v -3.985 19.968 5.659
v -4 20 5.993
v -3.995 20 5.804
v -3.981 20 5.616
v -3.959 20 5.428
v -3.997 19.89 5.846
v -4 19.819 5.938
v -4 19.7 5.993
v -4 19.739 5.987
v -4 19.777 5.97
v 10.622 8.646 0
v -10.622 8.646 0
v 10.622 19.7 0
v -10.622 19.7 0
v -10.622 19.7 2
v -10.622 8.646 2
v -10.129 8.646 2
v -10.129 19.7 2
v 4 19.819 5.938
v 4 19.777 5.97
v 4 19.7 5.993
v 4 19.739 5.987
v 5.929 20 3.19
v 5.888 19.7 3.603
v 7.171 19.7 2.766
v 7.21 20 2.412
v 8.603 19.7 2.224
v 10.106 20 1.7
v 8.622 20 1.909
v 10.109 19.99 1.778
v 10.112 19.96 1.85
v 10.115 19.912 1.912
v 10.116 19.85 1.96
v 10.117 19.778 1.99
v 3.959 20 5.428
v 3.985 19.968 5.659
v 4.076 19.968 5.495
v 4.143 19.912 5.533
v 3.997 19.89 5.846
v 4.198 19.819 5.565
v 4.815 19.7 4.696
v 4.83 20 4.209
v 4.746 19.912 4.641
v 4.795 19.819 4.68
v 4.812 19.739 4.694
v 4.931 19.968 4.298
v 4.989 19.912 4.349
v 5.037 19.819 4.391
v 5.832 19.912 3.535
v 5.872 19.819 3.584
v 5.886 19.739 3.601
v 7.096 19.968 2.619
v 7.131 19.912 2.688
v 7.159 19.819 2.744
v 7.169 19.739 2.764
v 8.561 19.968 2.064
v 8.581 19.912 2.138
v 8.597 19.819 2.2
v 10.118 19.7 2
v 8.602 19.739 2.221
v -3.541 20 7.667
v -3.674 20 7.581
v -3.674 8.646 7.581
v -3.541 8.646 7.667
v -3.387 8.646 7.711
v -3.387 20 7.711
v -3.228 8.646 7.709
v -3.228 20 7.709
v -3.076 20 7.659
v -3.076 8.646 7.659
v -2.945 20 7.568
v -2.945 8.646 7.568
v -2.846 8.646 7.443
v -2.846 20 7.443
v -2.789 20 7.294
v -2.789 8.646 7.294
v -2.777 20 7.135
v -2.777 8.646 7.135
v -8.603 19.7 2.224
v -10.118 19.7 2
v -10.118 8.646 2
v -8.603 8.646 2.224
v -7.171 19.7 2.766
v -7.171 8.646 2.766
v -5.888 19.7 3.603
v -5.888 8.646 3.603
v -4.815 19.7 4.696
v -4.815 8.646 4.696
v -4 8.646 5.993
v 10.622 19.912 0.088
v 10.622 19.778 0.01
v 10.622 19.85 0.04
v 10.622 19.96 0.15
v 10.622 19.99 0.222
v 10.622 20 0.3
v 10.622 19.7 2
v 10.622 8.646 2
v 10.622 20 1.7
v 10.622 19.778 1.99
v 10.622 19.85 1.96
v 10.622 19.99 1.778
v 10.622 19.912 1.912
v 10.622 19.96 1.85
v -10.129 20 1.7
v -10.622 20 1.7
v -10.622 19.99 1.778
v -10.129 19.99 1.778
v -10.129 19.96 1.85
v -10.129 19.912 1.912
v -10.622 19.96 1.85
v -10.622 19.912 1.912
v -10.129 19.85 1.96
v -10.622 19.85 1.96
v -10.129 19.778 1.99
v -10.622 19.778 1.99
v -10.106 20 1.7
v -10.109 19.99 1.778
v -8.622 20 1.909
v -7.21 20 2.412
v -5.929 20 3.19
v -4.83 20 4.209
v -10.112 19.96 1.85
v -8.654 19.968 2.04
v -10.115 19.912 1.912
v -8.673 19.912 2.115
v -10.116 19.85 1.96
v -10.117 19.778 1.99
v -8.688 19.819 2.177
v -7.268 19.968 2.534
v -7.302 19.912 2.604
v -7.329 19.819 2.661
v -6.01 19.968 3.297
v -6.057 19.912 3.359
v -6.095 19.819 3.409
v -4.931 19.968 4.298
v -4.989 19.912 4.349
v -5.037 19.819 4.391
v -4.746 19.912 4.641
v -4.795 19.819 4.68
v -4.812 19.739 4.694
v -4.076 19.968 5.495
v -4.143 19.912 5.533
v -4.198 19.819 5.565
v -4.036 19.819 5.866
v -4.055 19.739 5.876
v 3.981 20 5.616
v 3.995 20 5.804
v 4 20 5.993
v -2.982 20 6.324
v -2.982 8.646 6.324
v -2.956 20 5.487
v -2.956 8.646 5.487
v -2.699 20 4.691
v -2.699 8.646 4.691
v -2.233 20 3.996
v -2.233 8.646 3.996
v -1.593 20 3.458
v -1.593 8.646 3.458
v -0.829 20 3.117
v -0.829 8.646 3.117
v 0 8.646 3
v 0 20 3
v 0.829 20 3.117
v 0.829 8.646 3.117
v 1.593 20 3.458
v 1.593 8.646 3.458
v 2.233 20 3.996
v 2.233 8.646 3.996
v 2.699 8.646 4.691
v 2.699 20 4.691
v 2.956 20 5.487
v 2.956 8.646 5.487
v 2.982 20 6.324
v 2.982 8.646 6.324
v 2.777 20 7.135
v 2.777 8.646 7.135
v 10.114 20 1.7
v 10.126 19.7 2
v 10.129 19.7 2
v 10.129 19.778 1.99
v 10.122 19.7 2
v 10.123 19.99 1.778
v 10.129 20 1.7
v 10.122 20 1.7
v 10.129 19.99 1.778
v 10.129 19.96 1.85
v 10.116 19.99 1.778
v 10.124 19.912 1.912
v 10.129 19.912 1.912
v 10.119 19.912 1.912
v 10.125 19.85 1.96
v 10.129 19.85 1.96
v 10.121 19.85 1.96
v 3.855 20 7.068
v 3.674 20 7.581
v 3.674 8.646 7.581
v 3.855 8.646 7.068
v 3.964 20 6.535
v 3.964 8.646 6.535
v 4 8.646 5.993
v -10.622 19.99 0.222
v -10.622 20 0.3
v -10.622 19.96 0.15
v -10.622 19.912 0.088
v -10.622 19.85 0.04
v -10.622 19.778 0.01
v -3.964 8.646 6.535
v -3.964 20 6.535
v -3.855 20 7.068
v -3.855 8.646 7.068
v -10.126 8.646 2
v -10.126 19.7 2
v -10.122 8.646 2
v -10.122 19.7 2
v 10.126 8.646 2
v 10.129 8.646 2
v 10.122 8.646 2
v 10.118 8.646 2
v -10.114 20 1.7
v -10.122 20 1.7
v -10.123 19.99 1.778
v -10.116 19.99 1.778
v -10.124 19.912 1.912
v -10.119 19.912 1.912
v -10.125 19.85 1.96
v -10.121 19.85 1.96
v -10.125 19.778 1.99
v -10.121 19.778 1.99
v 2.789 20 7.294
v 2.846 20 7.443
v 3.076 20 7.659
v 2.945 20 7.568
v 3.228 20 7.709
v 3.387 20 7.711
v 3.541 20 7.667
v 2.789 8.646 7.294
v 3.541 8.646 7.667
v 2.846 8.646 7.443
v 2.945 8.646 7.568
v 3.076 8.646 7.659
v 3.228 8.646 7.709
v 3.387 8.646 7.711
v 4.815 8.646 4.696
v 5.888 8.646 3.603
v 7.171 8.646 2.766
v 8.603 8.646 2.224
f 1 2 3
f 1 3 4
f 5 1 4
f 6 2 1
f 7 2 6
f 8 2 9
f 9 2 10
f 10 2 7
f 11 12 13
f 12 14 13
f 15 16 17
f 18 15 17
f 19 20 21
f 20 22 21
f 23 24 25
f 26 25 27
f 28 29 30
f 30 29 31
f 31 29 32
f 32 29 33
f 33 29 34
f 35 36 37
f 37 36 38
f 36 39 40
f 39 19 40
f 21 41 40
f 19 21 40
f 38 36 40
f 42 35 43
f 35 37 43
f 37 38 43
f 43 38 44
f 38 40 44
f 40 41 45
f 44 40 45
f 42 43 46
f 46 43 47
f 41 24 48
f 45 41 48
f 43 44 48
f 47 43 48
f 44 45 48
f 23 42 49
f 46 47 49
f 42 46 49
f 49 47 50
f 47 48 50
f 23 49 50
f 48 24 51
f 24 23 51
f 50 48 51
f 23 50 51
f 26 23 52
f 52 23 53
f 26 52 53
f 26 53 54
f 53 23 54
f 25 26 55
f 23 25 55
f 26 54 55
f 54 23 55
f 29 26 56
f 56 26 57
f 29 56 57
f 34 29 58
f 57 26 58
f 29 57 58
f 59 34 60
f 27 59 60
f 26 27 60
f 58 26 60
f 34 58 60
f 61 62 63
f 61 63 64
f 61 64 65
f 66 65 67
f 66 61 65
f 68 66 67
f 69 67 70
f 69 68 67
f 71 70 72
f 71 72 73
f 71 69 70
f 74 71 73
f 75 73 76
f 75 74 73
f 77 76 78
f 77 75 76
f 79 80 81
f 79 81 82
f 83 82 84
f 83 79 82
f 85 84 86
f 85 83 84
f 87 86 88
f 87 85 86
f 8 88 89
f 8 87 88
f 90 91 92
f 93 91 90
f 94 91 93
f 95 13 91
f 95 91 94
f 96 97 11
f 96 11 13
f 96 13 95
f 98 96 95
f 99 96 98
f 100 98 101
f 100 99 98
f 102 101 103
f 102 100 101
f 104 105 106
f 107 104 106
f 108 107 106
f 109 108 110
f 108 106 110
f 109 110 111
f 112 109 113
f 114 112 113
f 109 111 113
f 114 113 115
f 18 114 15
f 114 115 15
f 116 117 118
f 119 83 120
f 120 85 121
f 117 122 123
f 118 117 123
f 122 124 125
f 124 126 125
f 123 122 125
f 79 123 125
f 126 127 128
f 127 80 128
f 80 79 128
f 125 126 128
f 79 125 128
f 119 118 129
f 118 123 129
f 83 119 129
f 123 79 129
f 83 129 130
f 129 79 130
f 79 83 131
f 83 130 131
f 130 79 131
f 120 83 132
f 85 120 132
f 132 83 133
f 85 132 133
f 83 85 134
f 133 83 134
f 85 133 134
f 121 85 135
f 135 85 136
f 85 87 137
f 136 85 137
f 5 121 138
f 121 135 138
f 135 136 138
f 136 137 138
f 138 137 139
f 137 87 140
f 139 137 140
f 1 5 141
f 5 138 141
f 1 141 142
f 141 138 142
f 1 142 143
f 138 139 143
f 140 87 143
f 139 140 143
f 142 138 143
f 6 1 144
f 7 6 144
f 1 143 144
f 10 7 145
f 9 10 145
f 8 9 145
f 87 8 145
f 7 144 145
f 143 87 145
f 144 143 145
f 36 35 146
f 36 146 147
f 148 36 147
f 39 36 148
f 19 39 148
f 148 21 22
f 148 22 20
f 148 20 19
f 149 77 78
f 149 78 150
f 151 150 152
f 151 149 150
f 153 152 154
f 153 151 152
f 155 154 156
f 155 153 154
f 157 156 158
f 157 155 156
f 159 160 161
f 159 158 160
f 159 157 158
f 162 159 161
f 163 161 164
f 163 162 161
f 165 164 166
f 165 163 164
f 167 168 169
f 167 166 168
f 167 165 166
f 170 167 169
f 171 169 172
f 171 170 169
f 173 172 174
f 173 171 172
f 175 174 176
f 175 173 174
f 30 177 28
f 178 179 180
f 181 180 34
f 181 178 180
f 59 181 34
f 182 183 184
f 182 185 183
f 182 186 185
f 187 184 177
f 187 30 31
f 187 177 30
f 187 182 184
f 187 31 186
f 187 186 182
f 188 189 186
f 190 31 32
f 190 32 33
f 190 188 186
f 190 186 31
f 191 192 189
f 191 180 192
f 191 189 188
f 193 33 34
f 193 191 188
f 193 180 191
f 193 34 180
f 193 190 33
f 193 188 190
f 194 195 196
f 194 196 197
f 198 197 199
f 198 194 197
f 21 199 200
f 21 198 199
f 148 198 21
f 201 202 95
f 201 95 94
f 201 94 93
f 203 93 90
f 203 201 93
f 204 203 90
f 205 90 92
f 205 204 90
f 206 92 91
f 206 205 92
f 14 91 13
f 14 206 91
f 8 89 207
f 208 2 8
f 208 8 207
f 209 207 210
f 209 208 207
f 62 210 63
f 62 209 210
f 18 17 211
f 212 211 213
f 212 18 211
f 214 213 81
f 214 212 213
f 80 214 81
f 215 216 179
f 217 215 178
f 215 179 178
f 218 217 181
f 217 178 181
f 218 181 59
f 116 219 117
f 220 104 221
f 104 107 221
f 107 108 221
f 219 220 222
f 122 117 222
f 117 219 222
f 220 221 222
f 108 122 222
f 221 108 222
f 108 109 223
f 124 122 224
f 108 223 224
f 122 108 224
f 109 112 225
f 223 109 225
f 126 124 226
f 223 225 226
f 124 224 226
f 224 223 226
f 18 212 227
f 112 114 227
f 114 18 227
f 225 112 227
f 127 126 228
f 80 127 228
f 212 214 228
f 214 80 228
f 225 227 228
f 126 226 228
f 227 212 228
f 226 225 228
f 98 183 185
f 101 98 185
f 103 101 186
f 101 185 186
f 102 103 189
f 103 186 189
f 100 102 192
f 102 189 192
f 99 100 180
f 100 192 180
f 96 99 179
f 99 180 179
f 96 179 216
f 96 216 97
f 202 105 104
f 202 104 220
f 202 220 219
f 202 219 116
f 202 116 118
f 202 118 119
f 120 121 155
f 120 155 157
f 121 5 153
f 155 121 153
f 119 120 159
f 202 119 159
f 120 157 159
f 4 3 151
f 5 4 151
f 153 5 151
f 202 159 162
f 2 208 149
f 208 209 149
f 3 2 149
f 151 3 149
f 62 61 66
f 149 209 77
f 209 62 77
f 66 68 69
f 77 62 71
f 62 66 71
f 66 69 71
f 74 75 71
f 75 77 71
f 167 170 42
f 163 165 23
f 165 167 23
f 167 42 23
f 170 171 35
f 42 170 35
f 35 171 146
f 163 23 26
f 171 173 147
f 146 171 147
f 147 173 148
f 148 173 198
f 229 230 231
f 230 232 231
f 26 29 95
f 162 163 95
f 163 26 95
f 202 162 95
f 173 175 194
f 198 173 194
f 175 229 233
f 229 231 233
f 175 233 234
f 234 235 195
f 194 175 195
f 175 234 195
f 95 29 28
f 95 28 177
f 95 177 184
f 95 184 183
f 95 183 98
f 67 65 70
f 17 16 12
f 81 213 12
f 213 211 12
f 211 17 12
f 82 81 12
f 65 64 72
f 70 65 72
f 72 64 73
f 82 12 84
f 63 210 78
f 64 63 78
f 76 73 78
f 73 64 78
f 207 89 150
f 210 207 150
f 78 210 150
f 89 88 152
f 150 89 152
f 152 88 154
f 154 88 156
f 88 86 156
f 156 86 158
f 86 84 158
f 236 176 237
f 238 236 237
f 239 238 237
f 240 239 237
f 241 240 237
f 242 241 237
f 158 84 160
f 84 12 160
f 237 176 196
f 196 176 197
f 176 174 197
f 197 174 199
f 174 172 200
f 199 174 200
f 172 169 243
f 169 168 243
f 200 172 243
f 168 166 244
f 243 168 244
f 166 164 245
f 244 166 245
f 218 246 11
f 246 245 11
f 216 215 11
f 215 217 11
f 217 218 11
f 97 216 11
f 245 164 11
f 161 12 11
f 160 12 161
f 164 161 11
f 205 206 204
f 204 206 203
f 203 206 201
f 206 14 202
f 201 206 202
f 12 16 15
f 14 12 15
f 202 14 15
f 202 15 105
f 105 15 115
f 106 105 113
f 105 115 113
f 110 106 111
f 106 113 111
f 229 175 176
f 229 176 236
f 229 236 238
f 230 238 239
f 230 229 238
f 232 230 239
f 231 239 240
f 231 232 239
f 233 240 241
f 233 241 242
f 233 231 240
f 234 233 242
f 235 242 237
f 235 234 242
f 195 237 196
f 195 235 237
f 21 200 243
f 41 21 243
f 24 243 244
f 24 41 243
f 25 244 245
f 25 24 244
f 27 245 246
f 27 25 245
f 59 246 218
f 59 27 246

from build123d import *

# Parameters (mm, degrees)
F1_DEPTH     = 2
F3_DEPTH     = 40
F4_T1_DEPTH  = 40
F4_T3_DEPTH  = 90
F4_T5_DEPTH  = 20
F4_T8_ANGLE  = 90
F4_T10_ANGLE = 90
F4_T12_ANGLE = 90
F4_T14_ANGLE = 90
F4_T15_DEPTH = 20
F4_T17_DEPTH = 34.8706177507
F4_T19_DEPTH = 34.8706177507
F4_T22_ANGLE = 90
F4_T24_ANGLE = 90
F4_T26_ANGLE = 90
F4_T28_ANGLE = 90
F4_T32_ANGLE = 67.9058899257
F4_S33_R     = 4
F4_T34_DEPTH = 6
F4_T38_ANGLE = 67.9058899257
F4_S39_R     = 4
F4_T40_DEPTH = 6
F4_T42_ANGLE = 2.1985680139
F4_T44_ANGLE = 2.1985680139
F4_T46_ANGLE = 145.4380511244
F4_T48_ANGLE = 145.4380511244
F5_W         = 47.7962438017
F5_H         = 14.3843935803
F6_DEPTH     = 25
F7_W         = 52.0751457661
F7_H         = 31.3179213554
F8_DEPTH     = 25


# Not quite as in the source:
# - a fillet or chamfer that OpenCascade refuses, or shapes differently, is made with other operations: its cross-section is extruded or revolved along the edge and cut away or added


with BuildPart() as f1:
    # F0 (on Top) → F1 (new body)
    with BuildSketch(Plane.XY):
        with BuildLine():
            Line((45, 20), (-45, 20))
            ThreePointArc((-45, 20), (-52.0710678119, 17.0710678119), (-55, 10))
            Line((-55, 10), (-55, -10))
            ThreePointArc((-55, -10), (-52.0710678119, -17.0710678119), (-45, -20))
            Line((-45, -20), (45, -20))
            ThreePointArc((45, -20), (52.0710678119, -17.0710678119), (55, -10))
            Line((55, -10), (55, 10))
            ThreePointArc((55, 10), (52.0710678119, 17.0710678119), (45, 20))
        make_face()
    extrude(amount=F1_DEPTH)

    # F2 (on face) → F3 (join, through all)
    with BuildSketch(Plane(origin=(0, 20, 0), x_dir=(-1, 0, 0), z_dir=(0, 1, 0))):
        with BuildLine():
            ThreePointArc((2.7771054409, 7.1347622527), (0, 3), (-2.7771054409, 7.1347622527))
            ThreePointArc((-2.7771054409, 7.1347622527), (-3.0758368725, 7.6594328143), (-3.674432988, 7.5806777712))
            ThreePointArc((-3.674432988, 7.5806777712), (-3.9185059144, 6.8033127653), (-3.9999931862, 5.9926169097))
            ThreePointArc((-3.9999931862, 5.9926169097), (-6.509106512, 3.1485501635), (-10.1236877963, 2))
            Line((-10.1236877963, 2), (10.1236877963, 2))
            ThreePointArc((10.1236877963, 2), (6.509106512, 3.1485501635), (3.9999931862, 5.9926169097))
            ThreePointArc((3.9999931862, 5.9926169097), (3.9185059144, 6.8033127653), (3.674432988, 7.5806777712))
            ThreePointArc((3.674432988, 7.5806777712), (3.0758368725, 7.6594328143), (2.7771054409, 7.1347622527))
        make_face()
    extrude(amount=-F3_DEPTH)

    # F4: fillet of radius 0.3 on 22 edges, made by hand

    # F4_s2 → F4_t1 (join)
    with BuildSketch(Plane.XZ.offset(-20)):
        with BuildLine():
            ThreePointArc((10.1293822493, 2), (10.1236267648, 2.0000552144), (10.1178733989, 2.0002208373))
            ThreePointArc((10.1178733989, 2.0002208373), (10.120780575, 2.0001098236), (10.1236877963, 2))
            Line((10.1236877963, 2), (10.1293822493, 2))
        make_face()
        with BuildLine():
            ThreePointArc((-10.1293822493, 2), (-10.1236267648, 2.0000552144), (-10.1178733989, 2.0002208373))
            ThreePointArc((-10.1178733989, 2.0002208373), (-10.120780575, 2.0001098236), (-10.1236877963, 2))
            Line((-10.1236877963, 2), (-10.1293822493, 2))
        make_face()
    extrude(amount=F4_T1_DEPTH)

    # F4_s4 → F4_t3 (cut)
    with BuildSketch(Plane.YZ.offset(-45)):
        with BuildLine():
            ThreePointArc((20, 0.3), (19.9121320344, 0.0878679656), (19.7, 0))
            Line((19.7, 0), (20, 0))
            Line((20, 0), (20, 0.3))
        make_face()
        with BuildLine():
            ThreePointArc((-19.7, 0), (-19.9121320344, 0.0878679656), (-20, 0.3))
            Line((-20, 0.3), (-20, 0))
            Line((-20, 0), (-19.7, 0))
        make_face()
    extrude(amount=F4_T3_DEPTH, mode=Mode.SUBTRACT)

    # F4_s6 → F4_t5 (cut)
    with BuildSketch(Plane.XZ.offset(-10)):
        with BuildLine():
            ThreePointArc((-54.7, 0), (-54.9121320344, 0.0878679656), (-55, 0.3))
            Line((-55, 0.3), (-55, 0))
            Line((-55, 0), (-54.7, 0))
        make_face()
        with BuildLine():
            ThreePointArc((54.7, 0), (54.9121320344, 0.0878679656), (55, 0.3))
            Line((55, 0.3), (55, 0))
            Line((55, 0), (54.7, 0))
        make_face()
    extrude(amount=F4_T5_DEPTH, mode=Mode.SUBTRACT)

    # F4_s7 → F4_t8 (revolve, cut)
    with BuildSketch(Plane.YZ.offset(-45)):
        with BuildLine():
            ThreePointArc((20, 0.3), (19.9121320344, 0.0878679656), (19.7, 0))
            Line((19.7, 0), (20, 0))
            Line((20, 0), (20, 0.3))
        make_face()
    revolve(axis=Axis((-45, 10, 0), (0, 0, 1)), revolution_arc=F4_T8_ANGLE, mode=Mode.SUBTRACT)

    # F4_s9 → F4_t10 (revolve, cut)
    with BuildSketch(Plane.XZ.offset(10)):
        with BuildLine():
            ThreePointArc((-54.7, 0), (-54.9121320344, 0.0878679656), (-55, 0.3))
            Line((-55, 0.3), (-55, 0))
            Line((-55, 0), (-54.7, 0))
        make_face()
    revolve(axis=Axis((-45, -10, 0), (0, 0, 1)), revolution_arc=F4_T10_ANGLE, mode=Mode.SUBTRACT)

    # F4_s11 → F4_t12 (revolve, cut)
    with BuildSketch(Plane.YZ.offset(45)):
        with BuildLine():
            ThreePointArc((-19.7, 0), (-19.9121320344, 0.0878679656), (-20, 0.3))
            Line((-20, 0.3), (-20, 0))
            Line((-20, 0), (-19.7, 0))
        make_face()
    revolve(axis=Axis((45, -10, 0), (0, 0, 1)), revolution_arc=F4_T12_ANGLE, mode=Mode.SUBTRACT)

    # F4_s13 → F4_t14 (revolve, cut)
    with BuildSketch(Plane.XZ.offset(-10)):
        with BuildLine():
            ThreePointArc((55, 0.3), (54.9121320344, 0.0878679656), (54.7, 0))
            Line((54.7, 0), (55, 0))
            Line((55, 0), (55, 0.3))
        make_face()
    revolve(axis=Axis((45, 10, 0), (0, 0, 1)), revolution_arc=F4_T14_ANGLE, mode=Mode.SUBTRACT)

    # F4_s16 → F4_t15 (cut)
    with BuildSketch(Plane.XZ.offset(-10)):
        with BuildLine():
            ThreePointArc((54.7, 2), (54.9121320344, 1.9121320344), (55, 1.7))
            Line((55, 1.7), (55, 2))
            Line((55, 2), (54.7, 2))
        make_face()
        with BuildLine():
            ThreePointArc((-54.7, 2), (-54.9121320344, 1.9121320344), (-55, 1.7))
            Line((-55, 1.7), (-55, 2))
            Line((-55, 2), (-54.7, 2))
        make_face()
    extrude(amount=F4_T15_DEPTH, mode=Mode.SUBTRACT)

    # F4_s18 → F4_t17 (cut)
    with BuildSketch(Plane.YZ.offset(10.1293822493)):
        with BuildLine():
            ThreePointArc((-19.7, 2), (-19.9121320344, 1.9121320344), (-20, 1.7))
            Line((-20, 1.7), (-20, 2))
            Line((-20, 2), (-19.7, 2))
        make_face()
        with BuildLine():
            ThreePointArc((20, 1.7), (19.9121320344, 1.9121320344), (19.7, 2))
            Line((19.7, 2), (20, 2))
            Line((20, 2), (20, 1.7))
        make_face()
    extrude(amount=F4_T17_DEPTH, mode=Mode.SUBTRACT)

    # F4_s20 → F4_t19 (cut)
    with BuildSketch(Plane.YZ.offset(-45)):
        with BuildLine():
            ThreePointArc((-19.7, 2), (-19.9121320344, 1.9121320344), (-20, 1.7))
            Line((-20, 1.7), (-20, 2))
            Line((-20, 2), (-19.7, 2))
        make_face()
        with BuildLine():
            ThreePointArc((20, 1.7), (19.9121320344, 1.9121320344), (19.7, 2))
            Line((19.7, 2), (20, 2))
            Line((20, 2), (20, 1.7))
        make_face()
    extrude(amount=F4_T19_DEPTH, mode=Mode.SUBTRACT)

    # F4_s21 → F4_t22 (revolve, cut)
    with BuildSketch(Plane.XZ.offset(-10)):
        with BuildLine():
            ThreePointArc((54.7, 2), (54.9121320344, 1.9121320344), (55, 1.7))
            Line((55, 1.7), (55, 2))
            Line((55, 2), (54.7, 2))
        make_face()
    revolve(axis=Axis((45, 10, 2), (0, 0, 1)), revolution_arc=F4_T22_ANGLE, mode=Mode.SUBTRACT)

    # F4_s23 → F4_t24 (revolve, cut)
    with BuildSketch(Plane.YZ.offset(45)):
        with BuildLine():
            ThreePointArc((-19.7, 2), (-19.9121320344, 1.9121320344), (-20, 1.7))
            Line((-20, 1.7), (-20, 2))
            Line((-20, 2), (-19.7, 2))
        make_face()
    revolve(axis=Axis((45, -10, 2), (0, 0, 1)), revolution_arc=F4_T24_ANGLE, mode=Mode.SUBTRACT)

    # F4_s25 → F4_t26 (revolve, cut)
    with BuildSketch(Plane.XZ.offset(10)):
        with BuildLine():
            ThreePointArc((-54.7, 2), (-54.9121320344, 1.9121320344), (-55, 1.7))
            Line((-55, 1.7), (-55, 2))
            Line((-55, 2), (-54.7, 2))
        make_face()
    revolve(axis=Axis((-45, -10, 2), (0, 0, 1)), revolution_arc=F4_T26_ANGLE, mode=Mode.SUBTRACT)

    # F4_s27 → F4_t28 (revolve, cut)
    with BuildSketch(Plane.YZ.offset(-45)):
        with BuildLine():
            ThreePointArc((20, 1.7), (19.9121320344, 1.9121320344), (19.7, 2))
            Line((19.7, 2), (20, 2))
            Line((20, 2), (20, 1.7))
        make_face()
    revolve(axis=Axis((-45, 10, 2), (0, 0, 1)), revolution_arc=F4_T28_ANGLE, mode=Mode.SUBTRACT)


with BuildPart() as f4_tool30:
    # F4_s31 → F4_t32 (revolve)
    with BuildSketch(Plane(origin=(-1.7091793366, 0, 4.7227038559), x_dir=(0, 1, 0), z_dir=(-0.3403063894, 0, 0.9403146076))):
        with BuildLine():
            ThreePointArc((20, -5.4610241004), (19.9121320344, -5.6731561348), (19.7, -5.7610241004))
            Line((19.7, -5.7610241004), (20, -5.7610241004))
            Line((20, -5.7610241004), (20, -5.4610241004))
        make_face()
    revolve(axis=Axis((10.3905055755, 20, 9.1016638887), (0, -1, 0)), revolution_arc=F4_T32_ANGLE)

    # F4_s33 → F4_t34 (cut, symmetric)
    with BuildSketch(Plane.XZ.offset(-19.7)):
        with Locations((0, 6)):
            Circle(F4_S33_R)
    extrude(amount=F4_T34_DEPTH, both=True, mode=Mode.SUBTRACT)


with BuildPart() as f1_1:
    add(f1.part)

    # F4_t29: cut F4_tool30
    add(f4_tool30.part, mode=Mode.SUBTRACT)


with BuildPart() as f4_tool36:
    # F4_s37 → F4_t38 (revolve)
    with BuildSketch(Plane(origin=(-10.0263051977, 0, -0.3849208379), x_dir=(0, 1, 0), z_dir=(-0.9992638755, 0, -0.0383628346))):
        with BuildLine():
            ThreePointArc((20, -2.0868987298), (19.9121320344, -2.2990307641), (19.7, -2.3868987298))
            Line((19.7, -2.3868987298), (20, -2.3868987298))
            Line((20, -2.3868987298), (20, -2.0868987298))
        make_face()
    revolve(axis=Axis((-10.3905055755, 20, 9.1016638887), (0, -1, 0)), revolution_arc=F4_T38_ANGLE)

    # F4_s39 → F4_t40 (cut, symmetric)
    with BuildSketch(Plane.XZ.offset(-19.7)):
        with Locations((0, 6)):
            Circle(F4_S39_R)
    extrude(amount=F4_T40_DEPTH, both=True, mode=Mode.SUBTRACT)


with BuildPart() as f1_2:
    add(f1_1.part)

    # F4_t35: cut F4_tool36
    add(f4_tool36.part, mode=Mode.SUBTRACT)

    # F4_s41 → F4_t42 (revolve, cut)
    with BuildSketch(Plane.YZ.offset(-10.1293822493)):
        with BuildLine():
            ThreePointArc((20, 1.7), (19.9121320344, 1.9121320344), (19.7, 2))
            Line((19.7, 2), (20, 2))
            Line((20, 2), (20, 1.7))
        make_face()
    revolve(axis=Axis((-10.1293822493, 20, 2.3), (0, -1, 0)), revolution_arc=F4_T42_ANGLE, mode=Mode.SUBTRACT)

    # F4_s43 → F4_t44 (revolve, cut)
    with BuildSketch(Plane.YZ.offset(10.1293822493)):
        with BuildLine():
            ThreePointArc((20, 1.7), (19.9121320344, 1.9121320344), (19.7, 2))
            Line((19.7, 2), (20, 2))
            Line((20, 2), (20, 1.7))
        make_face()
    revolve(axis=Axis((10.1293822493, 20, 2.3), (0, 1, 0)), revolution_arc=F4_T44_ANGLE, mode=Mode.SUBTRACT)

    # F4_s45 → F4_t46 (revolve, cut)
    with BuildSketch(Plane.YZ.offset(-10.1293822493)):
        with BuildLine():
            ThreePointArc((-19.7, 2), (-19.9121320344, 1.9121320344), (-20, 1.7))
            Line((-20, 1.7), (-20, 2))
            Line((-20, 2), (-19.7, 2))
        make_face()
    revolve(axis=Axis((-10.1293822493, -20, 2.3), (0, -1, 0)), revolution_arc=F4_T46_ANGLE, mode=Mode.SUBTRACT)

    # F4_s47 → F4_t48 (revolve, cut)
    with BuildSketch(Plane.YZ.offset(10.1293822493)):
        with BuildLine():
            ThreePointArc((-19.7, 2), (-19.9121320344, 1.9121320344), (-20, 1.7))
            Line((-20, 1.7), (-20, 2))
            Line((-20, 2), (-19.7, 2))
        make_face()
    revolve(axis=Axis((10.1293822493, -20, 2.3), (0, 1, 0)), revolution_arc=F4_T48_ANGLE, mode=Mode.SUBTRACT)

    # F5 (on face) → F6 (cut)
    with BuildSketch(Plane.XY.offset(2)):
        with Locations((-34.5203755423, 13.9260510914)):
            Rectangle(F5_W, F5_H)
        Polygon((-10.6222536415, 6.7338543013), (-58.4184974432, 6.7338543013), (-58.4184974432, -28.1346440315), (65.8517405391, -28.1346440315), (65.8517405391, 6.7338543013), (58.4184974432, 6.7338543013), (10.6222536415, 6.7338543013), align=None)
        with Locations((34.5203755423, 13.9260510914)):
            Rectangle(F5_W, F5_H)
    extrude(amount=-F6_DEPTH, mode=Mode.SUBTRACT)

    # F7 (on Top) → F8 (cut)
    with BuildSketch(Plane.XY):
        with Locations((-5.8881500736, -7.0132566616)):
            Rectangle(F7_W, F7_H)
    extrude(amount=F8_DEPTH, mode=Mode.SUBTRACT)


solid = f1_2.part
